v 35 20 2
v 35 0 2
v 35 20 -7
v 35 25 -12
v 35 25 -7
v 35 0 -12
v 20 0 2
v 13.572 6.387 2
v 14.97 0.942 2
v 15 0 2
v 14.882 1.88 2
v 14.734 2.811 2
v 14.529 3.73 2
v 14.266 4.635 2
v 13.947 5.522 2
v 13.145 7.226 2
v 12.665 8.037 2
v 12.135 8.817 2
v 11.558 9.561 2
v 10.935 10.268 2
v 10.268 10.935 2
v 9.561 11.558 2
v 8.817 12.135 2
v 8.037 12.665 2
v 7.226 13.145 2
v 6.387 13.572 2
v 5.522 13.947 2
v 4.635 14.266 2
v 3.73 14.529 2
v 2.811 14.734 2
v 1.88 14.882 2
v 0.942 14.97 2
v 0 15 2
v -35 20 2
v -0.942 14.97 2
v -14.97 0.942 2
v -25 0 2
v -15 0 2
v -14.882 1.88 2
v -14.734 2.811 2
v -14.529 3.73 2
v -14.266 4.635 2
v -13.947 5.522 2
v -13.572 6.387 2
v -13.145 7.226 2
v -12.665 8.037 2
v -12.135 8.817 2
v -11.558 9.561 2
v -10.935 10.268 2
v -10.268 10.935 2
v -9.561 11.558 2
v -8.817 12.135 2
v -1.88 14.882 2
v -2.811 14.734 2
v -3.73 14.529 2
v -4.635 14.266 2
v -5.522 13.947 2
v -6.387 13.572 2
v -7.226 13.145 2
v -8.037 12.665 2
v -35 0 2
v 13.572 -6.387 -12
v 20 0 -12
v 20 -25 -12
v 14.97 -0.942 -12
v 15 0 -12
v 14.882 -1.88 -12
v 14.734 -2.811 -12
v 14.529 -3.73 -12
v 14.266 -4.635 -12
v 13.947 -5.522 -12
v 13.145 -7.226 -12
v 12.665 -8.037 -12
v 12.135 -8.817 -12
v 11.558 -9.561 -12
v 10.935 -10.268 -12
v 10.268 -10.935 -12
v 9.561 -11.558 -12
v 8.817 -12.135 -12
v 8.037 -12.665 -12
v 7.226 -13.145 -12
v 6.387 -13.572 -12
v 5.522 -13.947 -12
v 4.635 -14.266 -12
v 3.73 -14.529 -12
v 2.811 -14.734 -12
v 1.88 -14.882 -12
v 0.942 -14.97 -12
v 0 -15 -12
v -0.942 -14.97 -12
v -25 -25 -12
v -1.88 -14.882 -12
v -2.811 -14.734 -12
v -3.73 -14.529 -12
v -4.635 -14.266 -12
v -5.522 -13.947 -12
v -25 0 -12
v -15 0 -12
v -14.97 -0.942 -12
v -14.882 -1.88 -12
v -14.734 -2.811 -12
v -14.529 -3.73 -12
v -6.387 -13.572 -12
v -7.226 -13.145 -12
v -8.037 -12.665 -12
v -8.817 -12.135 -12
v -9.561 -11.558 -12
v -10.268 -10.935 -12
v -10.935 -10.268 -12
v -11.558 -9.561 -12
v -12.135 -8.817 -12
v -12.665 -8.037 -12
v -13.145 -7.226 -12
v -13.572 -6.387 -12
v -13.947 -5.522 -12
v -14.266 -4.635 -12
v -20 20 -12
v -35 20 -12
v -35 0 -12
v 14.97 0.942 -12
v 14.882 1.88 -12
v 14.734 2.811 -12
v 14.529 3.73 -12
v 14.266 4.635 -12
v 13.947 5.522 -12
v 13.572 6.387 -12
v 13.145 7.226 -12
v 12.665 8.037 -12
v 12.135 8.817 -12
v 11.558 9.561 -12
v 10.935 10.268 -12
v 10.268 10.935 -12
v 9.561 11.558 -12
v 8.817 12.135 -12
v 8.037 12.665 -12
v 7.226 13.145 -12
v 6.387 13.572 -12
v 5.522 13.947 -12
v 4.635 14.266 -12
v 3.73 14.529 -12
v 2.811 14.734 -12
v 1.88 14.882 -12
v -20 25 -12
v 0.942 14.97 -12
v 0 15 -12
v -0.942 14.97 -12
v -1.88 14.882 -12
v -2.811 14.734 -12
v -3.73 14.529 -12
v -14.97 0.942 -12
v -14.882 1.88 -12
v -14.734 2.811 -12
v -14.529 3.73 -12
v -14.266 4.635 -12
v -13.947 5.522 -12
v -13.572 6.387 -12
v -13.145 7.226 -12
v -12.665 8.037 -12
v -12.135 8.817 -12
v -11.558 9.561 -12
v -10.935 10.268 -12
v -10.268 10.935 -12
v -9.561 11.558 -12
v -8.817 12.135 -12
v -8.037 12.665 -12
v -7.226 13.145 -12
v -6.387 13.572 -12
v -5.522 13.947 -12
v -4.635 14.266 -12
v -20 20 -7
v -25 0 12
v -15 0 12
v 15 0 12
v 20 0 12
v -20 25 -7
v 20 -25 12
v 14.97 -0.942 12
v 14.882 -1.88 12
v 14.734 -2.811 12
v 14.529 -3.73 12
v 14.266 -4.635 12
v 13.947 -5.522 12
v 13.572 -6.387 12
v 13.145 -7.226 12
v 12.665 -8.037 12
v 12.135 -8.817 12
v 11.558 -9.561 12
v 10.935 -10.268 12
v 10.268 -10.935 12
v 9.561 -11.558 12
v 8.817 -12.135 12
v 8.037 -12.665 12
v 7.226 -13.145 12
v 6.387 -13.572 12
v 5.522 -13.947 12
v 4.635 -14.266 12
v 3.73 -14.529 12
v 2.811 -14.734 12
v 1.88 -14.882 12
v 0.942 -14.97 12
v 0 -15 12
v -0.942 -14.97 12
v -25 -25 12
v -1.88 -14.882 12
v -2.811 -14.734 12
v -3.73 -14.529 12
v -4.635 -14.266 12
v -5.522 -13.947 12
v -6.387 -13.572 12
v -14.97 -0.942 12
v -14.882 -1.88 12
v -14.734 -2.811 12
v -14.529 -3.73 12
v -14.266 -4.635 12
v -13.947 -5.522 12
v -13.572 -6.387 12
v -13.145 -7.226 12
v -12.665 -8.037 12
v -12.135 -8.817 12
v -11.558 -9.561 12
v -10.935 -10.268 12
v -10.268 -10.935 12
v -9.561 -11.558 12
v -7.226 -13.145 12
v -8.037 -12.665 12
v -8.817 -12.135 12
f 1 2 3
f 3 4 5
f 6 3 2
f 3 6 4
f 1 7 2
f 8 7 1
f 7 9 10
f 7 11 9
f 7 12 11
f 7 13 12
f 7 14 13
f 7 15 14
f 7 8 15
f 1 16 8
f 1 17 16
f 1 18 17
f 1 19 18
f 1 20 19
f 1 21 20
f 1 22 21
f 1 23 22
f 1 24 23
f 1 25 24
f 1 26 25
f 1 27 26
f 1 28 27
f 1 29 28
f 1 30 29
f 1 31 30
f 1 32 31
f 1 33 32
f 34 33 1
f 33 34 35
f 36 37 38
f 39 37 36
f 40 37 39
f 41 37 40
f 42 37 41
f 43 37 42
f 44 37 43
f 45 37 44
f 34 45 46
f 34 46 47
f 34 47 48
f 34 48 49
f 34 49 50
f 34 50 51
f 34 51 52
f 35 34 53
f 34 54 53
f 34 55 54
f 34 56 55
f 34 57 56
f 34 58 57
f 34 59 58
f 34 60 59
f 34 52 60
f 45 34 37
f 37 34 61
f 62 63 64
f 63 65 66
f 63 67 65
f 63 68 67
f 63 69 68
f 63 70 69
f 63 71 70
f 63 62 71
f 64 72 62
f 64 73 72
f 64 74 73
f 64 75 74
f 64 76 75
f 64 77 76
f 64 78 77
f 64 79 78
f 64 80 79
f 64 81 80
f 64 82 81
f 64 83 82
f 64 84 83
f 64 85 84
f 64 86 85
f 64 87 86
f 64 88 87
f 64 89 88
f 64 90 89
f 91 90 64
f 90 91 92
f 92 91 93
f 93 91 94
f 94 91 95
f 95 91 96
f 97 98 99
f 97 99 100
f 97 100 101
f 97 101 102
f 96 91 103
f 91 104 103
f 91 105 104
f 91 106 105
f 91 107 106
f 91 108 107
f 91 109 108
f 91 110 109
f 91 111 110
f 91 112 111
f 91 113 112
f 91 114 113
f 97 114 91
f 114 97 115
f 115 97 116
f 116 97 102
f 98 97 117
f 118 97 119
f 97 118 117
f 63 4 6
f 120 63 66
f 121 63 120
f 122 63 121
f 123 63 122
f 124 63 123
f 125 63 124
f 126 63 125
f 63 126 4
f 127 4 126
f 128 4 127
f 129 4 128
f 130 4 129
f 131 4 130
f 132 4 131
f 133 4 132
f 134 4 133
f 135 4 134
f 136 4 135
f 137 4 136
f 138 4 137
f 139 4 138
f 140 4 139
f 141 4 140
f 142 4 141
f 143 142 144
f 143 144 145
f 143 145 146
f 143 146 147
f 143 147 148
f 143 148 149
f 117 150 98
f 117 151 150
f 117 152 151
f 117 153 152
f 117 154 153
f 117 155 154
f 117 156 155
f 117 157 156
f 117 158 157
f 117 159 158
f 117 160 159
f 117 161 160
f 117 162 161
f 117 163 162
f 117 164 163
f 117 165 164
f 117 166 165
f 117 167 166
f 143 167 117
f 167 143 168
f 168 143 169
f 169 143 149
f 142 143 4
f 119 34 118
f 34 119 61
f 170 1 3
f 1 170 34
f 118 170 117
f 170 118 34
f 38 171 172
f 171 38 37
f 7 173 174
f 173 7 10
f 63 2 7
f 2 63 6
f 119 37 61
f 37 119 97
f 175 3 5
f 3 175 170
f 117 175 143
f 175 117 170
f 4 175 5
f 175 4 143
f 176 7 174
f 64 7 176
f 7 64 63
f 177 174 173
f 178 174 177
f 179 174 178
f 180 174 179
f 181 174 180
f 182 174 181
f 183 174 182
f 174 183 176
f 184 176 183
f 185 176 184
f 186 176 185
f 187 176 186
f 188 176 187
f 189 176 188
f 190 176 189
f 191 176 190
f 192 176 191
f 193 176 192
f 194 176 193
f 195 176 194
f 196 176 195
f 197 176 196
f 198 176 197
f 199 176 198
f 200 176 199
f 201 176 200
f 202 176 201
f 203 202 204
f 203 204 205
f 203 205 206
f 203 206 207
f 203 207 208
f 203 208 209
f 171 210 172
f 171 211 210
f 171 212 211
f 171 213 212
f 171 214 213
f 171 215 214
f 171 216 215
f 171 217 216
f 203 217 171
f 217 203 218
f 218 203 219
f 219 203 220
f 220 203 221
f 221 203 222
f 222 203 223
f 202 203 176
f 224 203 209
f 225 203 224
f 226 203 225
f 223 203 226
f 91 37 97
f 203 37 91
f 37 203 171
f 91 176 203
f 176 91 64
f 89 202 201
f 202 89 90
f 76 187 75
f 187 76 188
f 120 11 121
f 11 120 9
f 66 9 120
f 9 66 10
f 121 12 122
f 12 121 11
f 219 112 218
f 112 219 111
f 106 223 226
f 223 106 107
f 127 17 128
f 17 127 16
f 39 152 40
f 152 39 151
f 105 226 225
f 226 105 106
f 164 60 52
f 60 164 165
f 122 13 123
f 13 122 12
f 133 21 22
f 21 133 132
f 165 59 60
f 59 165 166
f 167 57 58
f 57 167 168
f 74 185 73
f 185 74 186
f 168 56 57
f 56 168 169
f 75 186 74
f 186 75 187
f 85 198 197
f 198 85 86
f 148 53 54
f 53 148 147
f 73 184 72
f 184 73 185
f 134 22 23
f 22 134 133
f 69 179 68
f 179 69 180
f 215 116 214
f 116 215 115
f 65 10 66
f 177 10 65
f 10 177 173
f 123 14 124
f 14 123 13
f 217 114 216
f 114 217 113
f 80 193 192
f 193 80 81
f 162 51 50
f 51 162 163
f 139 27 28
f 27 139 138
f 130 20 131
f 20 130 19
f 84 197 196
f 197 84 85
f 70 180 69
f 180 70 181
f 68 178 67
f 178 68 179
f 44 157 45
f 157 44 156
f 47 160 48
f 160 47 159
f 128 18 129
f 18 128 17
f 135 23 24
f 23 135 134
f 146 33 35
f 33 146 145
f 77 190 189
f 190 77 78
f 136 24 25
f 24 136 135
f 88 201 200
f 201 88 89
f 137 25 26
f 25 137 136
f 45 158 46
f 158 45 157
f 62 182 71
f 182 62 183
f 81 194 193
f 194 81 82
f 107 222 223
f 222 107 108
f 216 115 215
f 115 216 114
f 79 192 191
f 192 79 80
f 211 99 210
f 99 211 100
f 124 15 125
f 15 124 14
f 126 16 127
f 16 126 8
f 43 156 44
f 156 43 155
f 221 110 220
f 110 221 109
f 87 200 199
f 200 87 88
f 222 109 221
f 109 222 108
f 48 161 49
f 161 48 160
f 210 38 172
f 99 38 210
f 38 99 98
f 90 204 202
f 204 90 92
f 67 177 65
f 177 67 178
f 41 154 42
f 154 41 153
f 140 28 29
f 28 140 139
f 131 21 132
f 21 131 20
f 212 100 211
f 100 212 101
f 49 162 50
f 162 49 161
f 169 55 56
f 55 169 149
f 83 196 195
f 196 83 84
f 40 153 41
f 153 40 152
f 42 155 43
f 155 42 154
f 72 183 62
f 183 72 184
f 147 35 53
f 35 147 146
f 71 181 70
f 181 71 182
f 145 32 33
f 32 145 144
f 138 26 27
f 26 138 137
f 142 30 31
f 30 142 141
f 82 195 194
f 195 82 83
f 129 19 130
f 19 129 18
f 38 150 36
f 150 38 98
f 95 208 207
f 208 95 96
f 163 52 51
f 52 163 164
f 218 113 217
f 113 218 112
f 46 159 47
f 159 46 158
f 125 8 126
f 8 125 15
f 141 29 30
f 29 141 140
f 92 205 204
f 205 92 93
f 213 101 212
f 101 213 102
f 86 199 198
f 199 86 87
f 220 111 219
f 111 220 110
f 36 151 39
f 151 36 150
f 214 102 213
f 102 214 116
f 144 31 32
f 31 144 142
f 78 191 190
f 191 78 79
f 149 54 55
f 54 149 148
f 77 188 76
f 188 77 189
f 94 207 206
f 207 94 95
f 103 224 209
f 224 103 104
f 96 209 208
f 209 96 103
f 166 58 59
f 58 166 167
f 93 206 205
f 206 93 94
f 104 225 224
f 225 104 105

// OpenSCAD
H1=14;
H2=5;
H3=24;

C=70;
D=20;

A=15;
B=0;
E=5;

F=15;
I=25;
G=10;

//trikotnik
TA=0;
TB=0;
TD=0;
TXr=0;
TYr=0;
TZr=0;
TX=0;
TY=0;
TZ=15/2;

//kvader-luknja
L=0;
M=5;
KX=-10;
KY=-5;
KZ=0;
KXr=0;
KYr=0;
KZr=0;

//cilinder-luknja
CR=15;
CXr=0;
CYr=0;
CZr=0;
CX=0;
CY=0;
CZ=0;

max_d_luknje=sqrt(pow(C,2)+pow(E+D+I,2))*2;

difference(){
	translate([-C/2,-(E+D-I)/2,-max(H1,H2,H3)/2]){
		cube([C,D,H1]);
		translate([A,D,0]){
			cube([C-A-B,E,H2]);
		}
		translate([G,-I,0]){
			cube([C-G-F,I,H3]);
		}
	}

	#translate([CX,CY,CZ]){
		rotate([CXr,CYr,CZr]){
			cylinder(h=max_d_luknje,r=CR,center=true, $fn=100);
		}
	}
	
	#translate([KX,KY,KZ]){
		rotate([KXr,KYr,KZr]){
			cube([L,M,max_d_luknje],center=true);
		}
	}
}

if(TD>0)
rotate([TXr,TYr,TZr]){
translate([TX,TY,TZ]){
linear_extrude(height = TD, center = true, convexity = 10, twist = 0){
polygon(points=[[-TB/2,-TA/2],[TB/2,-TA/2],[-TB/2,TA]], paths=[[0,1,2]]);
}
}
}
